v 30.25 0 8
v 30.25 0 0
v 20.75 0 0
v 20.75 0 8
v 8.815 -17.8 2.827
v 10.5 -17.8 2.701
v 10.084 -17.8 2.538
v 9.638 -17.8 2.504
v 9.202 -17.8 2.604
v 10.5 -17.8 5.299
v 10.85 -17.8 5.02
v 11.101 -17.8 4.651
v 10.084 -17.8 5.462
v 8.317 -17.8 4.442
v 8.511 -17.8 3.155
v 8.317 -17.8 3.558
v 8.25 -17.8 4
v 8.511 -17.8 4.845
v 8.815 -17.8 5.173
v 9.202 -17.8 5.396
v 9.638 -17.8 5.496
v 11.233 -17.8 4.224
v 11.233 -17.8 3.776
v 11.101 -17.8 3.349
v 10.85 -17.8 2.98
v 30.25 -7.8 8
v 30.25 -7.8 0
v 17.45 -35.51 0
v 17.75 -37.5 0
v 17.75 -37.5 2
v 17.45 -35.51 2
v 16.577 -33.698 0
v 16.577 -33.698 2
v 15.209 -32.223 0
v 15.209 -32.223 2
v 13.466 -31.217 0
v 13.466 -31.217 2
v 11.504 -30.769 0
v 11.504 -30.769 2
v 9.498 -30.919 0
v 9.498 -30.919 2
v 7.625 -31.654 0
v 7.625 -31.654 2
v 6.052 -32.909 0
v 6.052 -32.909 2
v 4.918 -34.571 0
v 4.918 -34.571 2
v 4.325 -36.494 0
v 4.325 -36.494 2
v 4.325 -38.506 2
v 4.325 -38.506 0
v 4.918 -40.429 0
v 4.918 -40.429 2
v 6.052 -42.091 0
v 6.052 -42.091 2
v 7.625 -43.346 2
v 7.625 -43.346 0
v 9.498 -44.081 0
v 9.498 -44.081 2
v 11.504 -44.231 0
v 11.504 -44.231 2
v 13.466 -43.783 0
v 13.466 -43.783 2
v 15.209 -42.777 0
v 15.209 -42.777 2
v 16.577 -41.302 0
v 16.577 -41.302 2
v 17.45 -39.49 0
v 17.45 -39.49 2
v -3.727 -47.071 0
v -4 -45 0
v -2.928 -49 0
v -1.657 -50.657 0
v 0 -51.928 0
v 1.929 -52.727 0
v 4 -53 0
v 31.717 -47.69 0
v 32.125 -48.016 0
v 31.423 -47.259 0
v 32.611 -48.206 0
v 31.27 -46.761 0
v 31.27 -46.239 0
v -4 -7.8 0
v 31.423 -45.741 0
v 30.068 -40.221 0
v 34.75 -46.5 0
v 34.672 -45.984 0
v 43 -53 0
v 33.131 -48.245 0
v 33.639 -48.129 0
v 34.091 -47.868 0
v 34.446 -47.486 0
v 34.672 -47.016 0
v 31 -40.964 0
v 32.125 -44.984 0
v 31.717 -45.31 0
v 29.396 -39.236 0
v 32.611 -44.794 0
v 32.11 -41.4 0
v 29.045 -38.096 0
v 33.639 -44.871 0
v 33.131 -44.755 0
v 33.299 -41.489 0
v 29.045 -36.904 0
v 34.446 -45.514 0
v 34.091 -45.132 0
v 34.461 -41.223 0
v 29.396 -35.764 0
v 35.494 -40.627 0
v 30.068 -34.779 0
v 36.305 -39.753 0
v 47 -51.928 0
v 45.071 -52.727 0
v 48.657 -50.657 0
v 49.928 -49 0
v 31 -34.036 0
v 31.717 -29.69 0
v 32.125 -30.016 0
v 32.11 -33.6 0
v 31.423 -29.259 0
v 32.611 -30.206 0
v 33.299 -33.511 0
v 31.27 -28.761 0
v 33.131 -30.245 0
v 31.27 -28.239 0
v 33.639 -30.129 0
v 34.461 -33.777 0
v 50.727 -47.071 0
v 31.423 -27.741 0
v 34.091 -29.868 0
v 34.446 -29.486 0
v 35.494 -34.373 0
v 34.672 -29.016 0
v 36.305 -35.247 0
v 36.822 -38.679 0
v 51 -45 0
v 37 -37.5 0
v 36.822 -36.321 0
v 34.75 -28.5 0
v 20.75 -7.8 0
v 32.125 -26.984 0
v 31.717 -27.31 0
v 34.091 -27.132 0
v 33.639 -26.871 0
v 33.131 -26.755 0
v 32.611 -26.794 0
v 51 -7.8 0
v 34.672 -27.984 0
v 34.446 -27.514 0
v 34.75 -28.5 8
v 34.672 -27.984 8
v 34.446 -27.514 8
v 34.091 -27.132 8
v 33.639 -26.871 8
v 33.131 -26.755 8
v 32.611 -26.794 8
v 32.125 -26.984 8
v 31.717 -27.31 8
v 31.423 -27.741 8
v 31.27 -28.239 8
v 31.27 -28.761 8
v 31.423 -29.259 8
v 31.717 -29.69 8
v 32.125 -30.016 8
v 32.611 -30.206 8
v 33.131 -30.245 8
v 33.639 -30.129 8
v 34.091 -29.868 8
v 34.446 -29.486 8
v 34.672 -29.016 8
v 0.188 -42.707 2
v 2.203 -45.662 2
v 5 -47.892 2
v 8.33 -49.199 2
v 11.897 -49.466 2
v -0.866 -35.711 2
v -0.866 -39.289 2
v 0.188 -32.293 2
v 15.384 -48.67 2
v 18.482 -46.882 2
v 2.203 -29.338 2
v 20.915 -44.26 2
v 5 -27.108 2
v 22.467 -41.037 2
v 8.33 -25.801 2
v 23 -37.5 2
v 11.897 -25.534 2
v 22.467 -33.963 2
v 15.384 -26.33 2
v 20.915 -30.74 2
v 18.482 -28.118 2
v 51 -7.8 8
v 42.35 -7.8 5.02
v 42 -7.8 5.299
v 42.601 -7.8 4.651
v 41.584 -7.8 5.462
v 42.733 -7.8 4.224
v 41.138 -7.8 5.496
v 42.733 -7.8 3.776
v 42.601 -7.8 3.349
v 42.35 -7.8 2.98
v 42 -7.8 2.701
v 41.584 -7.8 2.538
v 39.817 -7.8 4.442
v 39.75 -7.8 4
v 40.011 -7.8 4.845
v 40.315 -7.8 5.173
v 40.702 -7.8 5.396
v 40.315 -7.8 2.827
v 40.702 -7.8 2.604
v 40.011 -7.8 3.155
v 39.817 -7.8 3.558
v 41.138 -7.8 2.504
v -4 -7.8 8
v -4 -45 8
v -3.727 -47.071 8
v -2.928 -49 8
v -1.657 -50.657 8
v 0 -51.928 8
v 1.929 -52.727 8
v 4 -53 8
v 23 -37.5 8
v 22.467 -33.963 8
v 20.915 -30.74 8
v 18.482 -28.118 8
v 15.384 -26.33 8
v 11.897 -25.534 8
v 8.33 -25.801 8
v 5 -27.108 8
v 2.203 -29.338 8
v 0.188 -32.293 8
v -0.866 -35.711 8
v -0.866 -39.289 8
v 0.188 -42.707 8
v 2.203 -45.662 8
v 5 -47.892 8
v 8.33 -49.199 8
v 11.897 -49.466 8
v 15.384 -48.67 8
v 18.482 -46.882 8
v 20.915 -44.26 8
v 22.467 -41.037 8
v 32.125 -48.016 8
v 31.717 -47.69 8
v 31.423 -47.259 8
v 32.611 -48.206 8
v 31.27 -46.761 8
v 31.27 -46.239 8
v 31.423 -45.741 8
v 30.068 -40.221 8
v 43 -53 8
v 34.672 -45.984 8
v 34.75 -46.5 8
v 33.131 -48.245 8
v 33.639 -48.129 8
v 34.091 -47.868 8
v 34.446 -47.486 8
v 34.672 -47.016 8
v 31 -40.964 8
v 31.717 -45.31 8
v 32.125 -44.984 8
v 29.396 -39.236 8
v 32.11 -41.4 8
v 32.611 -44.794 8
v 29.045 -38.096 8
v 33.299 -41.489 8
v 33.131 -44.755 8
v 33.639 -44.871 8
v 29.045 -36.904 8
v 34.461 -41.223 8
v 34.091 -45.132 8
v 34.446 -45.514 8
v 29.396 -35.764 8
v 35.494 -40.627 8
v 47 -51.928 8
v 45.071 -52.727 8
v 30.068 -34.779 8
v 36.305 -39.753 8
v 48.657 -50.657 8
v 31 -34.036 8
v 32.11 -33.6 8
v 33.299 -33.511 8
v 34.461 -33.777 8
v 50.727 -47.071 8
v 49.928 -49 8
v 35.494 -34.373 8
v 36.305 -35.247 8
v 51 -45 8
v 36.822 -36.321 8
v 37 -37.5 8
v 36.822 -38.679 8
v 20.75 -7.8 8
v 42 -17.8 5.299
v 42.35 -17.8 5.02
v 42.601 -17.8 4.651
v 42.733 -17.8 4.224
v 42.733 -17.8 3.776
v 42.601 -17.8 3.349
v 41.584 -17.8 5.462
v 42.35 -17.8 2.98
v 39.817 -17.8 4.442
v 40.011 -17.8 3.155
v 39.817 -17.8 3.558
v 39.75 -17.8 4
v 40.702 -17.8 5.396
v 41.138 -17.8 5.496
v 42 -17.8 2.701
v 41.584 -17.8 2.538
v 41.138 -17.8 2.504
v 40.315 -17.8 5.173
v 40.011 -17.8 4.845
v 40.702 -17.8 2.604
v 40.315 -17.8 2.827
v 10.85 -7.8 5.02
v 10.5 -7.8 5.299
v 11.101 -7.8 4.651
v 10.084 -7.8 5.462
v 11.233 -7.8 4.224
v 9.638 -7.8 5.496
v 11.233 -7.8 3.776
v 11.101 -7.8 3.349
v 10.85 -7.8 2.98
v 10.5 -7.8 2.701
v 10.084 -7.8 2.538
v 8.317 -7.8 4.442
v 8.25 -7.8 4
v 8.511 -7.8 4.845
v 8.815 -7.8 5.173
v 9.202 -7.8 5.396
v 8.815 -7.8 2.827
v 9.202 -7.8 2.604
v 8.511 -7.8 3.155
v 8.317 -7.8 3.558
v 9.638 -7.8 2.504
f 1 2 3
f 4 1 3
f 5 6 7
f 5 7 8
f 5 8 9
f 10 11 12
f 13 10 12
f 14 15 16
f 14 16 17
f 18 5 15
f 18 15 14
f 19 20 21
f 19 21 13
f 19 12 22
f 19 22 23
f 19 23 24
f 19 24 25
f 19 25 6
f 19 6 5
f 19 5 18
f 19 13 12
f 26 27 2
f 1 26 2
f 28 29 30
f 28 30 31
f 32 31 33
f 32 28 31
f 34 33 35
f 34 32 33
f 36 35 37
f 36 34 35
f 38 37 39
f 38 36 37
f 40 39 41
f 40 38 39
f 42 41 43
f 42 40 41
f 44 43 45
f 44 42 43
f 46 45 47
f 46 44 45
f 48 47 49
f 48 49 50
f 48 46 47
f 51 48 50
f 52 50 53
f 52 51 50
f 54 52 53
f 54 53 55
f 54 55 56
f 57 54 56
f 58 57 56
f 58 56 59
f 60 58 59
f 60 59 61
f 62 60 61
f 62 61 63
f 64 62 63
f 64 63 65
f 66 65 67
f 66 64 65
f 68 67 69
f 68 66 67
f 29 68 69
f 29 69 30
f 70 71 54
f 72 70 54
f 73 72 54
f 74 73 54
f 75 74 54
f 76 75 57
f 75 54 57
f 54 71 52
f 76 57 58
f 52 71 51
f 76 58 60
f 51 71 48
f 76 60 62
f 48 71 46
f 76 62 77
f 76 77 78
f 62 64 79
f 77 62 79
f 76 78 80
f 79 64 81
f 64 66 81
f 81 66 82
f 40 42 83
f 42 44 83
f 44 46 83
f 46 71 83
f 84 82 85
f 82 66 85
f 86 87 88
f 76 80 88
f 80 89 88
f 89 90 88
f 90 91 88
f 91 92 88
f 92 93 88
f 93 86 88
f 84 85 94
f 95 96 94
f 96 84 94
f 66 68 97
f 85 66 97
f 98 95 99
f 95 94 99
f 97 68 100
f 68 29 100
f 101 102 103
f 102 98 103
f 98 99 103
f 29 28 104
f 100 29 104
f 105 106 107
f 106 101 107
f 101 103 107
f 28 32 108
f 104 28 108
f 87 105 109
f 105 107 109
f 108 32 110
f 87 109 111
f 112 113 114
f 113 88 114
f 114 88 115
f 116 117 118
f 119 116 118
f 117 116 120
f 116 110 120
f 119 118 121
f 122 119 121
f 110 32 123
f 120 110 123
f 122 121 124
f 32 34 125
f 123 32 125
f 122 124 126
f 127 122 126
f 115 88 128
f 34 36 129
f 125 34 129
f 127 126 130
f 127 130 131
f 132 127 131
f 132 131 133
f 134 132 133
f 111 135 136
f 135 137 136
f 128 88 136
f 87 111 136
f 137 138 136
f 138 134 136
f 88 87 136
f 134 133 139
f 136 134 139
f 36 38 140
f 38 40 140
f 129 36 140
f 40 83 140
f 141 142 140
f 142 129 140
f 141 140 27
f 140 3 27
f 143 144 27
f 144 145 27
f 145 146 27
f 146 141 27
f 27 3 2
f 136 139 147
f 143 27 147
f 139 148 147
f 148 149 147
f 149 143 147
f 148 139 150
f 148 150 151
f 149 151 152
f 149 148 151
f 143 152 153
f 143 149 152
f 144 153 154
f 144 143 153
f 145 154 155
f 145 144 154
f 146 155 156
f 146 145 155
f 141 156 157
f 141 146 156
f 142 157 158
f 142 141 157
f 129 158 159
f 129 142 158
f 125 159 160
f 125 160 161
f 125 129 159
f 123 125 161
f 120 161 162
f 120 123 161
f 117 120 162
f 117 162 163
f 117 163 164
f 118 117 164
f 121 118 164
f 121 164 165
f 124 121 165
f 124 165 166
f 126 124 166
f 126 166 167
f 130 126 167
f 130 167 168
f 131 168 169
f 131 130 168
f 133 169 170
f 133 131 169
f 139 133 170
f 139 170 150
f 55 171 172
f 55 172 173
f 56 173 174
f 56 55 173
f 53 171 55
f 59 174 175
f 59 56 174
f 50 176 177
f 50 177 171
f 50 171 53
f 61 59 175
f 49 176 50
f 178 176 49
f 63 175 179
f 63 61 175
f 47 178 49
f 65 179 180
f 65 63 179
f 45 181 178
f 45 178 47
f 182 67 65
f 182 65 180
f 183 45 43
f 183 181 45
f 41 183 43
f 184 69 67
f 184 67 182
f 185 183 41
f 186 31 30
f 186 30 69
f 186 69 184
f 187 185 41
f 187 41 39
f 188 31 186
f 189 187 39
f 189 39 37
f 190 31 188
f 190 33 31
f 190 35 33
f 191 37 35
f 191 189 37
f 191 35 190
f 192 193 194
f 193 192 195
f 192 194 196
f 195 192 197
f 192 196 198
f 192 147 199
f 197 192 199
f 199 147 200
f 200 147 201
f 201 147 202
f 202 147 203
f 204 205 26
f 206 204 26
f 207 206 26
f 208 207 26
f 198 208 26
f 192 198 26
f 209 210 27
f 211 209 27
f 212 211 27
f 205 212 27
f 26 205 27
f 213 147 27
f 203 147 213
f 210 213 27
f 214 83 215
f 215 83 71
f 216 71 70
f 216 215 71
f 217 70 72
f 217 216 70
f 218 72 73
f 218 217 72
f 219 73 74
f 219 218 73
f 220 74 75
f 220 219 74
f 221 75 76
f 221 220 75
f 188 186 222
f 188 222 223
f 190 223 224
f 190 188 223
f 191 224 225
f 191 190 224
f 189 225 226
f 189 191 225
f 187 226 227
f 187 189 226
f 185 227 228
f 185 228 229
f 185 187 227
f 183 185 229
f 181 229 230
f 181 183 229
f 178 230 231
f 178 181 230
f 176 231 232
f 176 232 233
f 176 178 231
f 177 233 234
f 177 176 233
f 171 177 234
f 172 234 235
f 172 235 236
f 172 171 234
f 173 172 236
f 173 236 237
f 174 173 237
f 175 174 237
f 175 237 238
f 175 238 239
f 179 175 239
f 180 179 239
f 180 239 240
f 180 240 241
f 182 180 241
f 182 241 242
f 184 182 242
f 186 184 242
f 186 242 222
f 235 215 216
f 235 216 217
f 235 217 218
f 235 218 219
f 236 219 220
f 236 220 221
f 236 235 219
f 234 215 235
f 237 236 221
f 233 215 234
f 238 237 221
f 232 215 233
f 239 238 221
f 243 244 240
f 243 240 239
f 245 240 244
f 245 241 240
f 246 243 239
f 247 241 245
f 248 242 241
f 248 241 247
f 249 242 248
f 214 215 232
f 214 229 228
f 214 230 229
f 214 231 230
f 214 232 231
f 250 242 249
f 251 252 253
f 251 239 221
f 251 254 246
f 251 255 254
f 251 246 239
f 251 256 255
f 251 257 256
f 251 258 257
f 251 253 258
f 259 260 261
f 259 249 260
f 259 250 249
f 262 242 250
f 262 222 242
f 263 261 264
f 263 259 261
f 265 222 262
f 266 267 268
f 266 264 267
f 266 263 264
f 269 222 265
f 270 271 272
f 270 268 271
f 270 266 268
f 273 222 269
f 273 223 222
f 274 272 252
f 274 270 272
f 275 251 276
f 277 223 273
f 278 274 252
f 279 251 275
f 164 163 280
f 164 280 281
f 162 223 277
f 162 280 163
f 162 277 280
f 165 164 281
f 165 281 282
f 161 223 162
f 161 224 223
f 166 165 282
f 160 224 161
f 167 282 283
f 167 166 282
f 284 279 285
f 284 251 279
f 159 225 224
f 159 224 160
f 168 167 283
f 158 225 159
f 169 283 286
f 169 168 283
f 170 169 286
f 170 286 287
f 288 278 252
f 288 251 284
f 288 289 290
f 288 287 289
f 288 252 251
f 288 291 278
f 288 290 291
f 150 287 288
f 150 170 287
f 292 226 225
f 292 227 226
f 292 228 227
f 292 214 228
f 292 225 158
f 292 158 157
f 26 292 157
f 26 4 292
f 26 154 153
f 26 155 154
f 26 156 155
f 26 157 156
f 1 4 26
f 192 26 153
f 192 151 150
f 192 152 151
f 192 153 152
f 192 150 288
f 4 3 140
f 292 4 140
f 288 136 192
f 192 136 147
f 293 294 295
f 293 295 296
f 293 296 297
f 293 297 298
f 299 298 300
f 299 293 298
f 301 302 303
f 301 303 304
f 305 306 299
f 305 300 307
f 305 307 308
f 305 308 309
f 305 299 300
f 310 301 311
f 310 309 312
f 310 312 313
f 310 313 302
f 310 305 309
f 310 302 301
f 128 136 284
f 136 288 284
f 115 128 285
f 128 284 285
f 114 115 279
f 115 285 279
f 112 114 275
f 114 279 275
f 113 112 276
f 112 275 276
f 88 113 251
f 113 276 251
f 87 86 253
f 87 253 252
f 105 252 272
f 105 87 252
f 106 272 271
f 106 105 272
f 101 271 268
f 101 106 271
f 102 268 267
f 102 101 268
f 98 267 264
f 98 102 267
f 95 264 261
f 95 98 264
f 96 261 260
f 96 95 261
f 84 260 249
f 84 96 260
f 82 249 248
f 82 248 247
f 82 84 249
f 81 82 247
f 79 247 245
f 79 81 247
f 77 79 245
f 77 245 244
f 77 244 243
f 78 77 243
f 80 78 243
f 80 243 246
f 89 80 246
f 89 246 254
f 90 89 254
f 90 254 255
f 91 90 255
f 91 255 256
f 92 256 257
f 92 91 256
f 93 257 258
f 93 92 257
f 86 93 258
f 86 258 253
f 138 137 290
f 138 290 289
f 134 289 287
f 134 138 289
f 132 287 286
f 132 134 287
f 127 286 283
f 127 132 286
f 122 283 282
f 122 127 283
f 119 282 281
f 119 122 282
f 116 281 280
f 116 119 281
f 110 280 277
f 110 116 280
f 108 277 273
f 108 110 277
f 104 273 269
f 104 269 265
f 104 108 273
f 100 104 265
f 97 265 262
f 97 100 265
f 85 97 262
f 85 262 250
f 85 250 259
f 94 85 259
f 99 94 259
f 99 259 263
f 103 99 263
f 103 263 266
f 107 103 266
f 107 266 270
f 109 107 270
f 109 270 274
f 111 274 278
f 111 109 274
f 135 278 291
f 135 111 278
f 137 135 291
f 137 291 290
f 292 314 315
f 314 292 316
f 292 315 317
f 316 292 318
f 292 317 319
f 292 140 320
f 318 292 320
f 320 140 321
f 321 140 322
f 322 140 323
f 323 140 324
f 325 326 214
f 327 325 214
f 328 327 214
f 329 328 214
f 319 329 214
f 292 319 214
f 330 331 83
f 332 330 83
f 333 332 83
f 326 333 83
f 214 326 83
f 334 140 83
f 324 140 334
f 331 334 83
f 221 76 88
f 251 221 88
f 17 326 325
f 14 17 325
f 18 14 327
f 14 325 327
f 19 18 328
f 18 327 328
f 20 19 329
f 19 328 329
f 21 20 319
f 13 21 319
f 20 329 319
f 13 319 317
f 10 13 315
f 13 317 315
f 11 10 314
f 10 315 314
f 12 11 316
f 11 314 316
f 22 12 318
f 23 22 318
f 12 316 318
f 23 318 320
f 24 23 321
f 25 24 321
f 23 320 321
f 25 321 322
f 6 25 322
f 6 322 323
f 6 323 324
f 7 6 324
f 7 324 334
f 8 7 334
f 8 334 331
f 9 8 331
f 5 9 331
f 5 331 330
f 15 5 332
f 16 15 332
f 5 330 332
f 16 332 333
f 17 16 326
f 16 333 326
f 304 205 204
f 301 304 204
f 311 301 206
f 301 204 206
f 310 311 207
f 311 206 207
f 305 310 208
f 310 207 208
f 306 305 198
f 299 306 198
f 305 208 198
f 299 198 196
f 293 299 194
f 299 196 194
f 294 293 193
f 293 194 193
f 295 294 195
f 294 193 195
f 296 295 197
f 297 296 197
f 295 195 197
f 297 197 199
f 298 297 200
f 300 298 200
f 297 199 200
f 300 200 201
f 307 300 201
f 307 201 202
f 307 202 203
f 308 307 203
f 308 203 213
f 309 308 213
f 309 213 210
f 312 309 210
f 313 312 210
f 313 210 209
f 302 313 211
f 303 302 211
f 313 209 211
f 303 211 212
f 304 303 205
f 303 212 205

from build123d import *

# Parameters (mm, degrees)
F0_R     = 12
F0_R_2   = 1.75
F0_R_3   = 4
F1_DEPTH = 8
F0_R_4   = 6.75
F2_DEPTH = 2
F3_R     = 8
F4_R     = 1.5
F5_DEPTH = 10


with BuildPart() as f1:
    # F0 (on Top) → F1 (new body)
    with BuildSketch(Plane.XY):
        Polygon((30.25, 0), (20.75, 0), (20.75, -7.8), (0, -7.8), (-4, -7.8), (-4, -53), (0, -53), (51, -53), (51, -7.8), (30.25, -7.8), align=None)
        with Locations((11, -37.5)):
            Circle(F0_R, mode=Mode.SUBTRACT)
        with Locations((33, -46.5)):
            Circle(F0_R_2, mode=Mode.SUBTRACT)
        with Locations((33, -37.5)):
            Circle(F0_R_3, mode=Mode.SUBTRACT)
        with Locations((33, -28.5)):
            Circle(F0_R_2, mode=Mode.SUBTRACT)
    extrude(amount=F1_DEPTH)

    # F0 (on Top) → F2 (join)
    with BuildSketch(Plane.XY):
        with Locations((11, -37.5)):
            Circle(F0_R)
        with Locations((11, -37.5)):
            Circle(F0_R_4, mode=Mode.SUBTRACT)
    extrude(amount=F2_DEPTH)

    # F3
    f3_edges = [f1.edges().sort_by_distance(p)[0] for p in [
        (-4, -53, 4),
        (51, -53, 4),
    ]]
    fillet(f3_edges, radius=F3_R)

    # F4 (on face) → F5 (cut)
    with BuildSketch(Plane(origin=(0, -7.8, 0), x_dir=(-1, 0, 0), z_dir=(0, 1, 0))):
        with Locations((-41.25, 4)):
            Circle(F4_R)
        with Locations((-9.75, 4)):
            Circle(F4_R)
    extrude(amount=-F5_DEPTH, mode=Mode.SUBTRACT)


solid = f1.part
